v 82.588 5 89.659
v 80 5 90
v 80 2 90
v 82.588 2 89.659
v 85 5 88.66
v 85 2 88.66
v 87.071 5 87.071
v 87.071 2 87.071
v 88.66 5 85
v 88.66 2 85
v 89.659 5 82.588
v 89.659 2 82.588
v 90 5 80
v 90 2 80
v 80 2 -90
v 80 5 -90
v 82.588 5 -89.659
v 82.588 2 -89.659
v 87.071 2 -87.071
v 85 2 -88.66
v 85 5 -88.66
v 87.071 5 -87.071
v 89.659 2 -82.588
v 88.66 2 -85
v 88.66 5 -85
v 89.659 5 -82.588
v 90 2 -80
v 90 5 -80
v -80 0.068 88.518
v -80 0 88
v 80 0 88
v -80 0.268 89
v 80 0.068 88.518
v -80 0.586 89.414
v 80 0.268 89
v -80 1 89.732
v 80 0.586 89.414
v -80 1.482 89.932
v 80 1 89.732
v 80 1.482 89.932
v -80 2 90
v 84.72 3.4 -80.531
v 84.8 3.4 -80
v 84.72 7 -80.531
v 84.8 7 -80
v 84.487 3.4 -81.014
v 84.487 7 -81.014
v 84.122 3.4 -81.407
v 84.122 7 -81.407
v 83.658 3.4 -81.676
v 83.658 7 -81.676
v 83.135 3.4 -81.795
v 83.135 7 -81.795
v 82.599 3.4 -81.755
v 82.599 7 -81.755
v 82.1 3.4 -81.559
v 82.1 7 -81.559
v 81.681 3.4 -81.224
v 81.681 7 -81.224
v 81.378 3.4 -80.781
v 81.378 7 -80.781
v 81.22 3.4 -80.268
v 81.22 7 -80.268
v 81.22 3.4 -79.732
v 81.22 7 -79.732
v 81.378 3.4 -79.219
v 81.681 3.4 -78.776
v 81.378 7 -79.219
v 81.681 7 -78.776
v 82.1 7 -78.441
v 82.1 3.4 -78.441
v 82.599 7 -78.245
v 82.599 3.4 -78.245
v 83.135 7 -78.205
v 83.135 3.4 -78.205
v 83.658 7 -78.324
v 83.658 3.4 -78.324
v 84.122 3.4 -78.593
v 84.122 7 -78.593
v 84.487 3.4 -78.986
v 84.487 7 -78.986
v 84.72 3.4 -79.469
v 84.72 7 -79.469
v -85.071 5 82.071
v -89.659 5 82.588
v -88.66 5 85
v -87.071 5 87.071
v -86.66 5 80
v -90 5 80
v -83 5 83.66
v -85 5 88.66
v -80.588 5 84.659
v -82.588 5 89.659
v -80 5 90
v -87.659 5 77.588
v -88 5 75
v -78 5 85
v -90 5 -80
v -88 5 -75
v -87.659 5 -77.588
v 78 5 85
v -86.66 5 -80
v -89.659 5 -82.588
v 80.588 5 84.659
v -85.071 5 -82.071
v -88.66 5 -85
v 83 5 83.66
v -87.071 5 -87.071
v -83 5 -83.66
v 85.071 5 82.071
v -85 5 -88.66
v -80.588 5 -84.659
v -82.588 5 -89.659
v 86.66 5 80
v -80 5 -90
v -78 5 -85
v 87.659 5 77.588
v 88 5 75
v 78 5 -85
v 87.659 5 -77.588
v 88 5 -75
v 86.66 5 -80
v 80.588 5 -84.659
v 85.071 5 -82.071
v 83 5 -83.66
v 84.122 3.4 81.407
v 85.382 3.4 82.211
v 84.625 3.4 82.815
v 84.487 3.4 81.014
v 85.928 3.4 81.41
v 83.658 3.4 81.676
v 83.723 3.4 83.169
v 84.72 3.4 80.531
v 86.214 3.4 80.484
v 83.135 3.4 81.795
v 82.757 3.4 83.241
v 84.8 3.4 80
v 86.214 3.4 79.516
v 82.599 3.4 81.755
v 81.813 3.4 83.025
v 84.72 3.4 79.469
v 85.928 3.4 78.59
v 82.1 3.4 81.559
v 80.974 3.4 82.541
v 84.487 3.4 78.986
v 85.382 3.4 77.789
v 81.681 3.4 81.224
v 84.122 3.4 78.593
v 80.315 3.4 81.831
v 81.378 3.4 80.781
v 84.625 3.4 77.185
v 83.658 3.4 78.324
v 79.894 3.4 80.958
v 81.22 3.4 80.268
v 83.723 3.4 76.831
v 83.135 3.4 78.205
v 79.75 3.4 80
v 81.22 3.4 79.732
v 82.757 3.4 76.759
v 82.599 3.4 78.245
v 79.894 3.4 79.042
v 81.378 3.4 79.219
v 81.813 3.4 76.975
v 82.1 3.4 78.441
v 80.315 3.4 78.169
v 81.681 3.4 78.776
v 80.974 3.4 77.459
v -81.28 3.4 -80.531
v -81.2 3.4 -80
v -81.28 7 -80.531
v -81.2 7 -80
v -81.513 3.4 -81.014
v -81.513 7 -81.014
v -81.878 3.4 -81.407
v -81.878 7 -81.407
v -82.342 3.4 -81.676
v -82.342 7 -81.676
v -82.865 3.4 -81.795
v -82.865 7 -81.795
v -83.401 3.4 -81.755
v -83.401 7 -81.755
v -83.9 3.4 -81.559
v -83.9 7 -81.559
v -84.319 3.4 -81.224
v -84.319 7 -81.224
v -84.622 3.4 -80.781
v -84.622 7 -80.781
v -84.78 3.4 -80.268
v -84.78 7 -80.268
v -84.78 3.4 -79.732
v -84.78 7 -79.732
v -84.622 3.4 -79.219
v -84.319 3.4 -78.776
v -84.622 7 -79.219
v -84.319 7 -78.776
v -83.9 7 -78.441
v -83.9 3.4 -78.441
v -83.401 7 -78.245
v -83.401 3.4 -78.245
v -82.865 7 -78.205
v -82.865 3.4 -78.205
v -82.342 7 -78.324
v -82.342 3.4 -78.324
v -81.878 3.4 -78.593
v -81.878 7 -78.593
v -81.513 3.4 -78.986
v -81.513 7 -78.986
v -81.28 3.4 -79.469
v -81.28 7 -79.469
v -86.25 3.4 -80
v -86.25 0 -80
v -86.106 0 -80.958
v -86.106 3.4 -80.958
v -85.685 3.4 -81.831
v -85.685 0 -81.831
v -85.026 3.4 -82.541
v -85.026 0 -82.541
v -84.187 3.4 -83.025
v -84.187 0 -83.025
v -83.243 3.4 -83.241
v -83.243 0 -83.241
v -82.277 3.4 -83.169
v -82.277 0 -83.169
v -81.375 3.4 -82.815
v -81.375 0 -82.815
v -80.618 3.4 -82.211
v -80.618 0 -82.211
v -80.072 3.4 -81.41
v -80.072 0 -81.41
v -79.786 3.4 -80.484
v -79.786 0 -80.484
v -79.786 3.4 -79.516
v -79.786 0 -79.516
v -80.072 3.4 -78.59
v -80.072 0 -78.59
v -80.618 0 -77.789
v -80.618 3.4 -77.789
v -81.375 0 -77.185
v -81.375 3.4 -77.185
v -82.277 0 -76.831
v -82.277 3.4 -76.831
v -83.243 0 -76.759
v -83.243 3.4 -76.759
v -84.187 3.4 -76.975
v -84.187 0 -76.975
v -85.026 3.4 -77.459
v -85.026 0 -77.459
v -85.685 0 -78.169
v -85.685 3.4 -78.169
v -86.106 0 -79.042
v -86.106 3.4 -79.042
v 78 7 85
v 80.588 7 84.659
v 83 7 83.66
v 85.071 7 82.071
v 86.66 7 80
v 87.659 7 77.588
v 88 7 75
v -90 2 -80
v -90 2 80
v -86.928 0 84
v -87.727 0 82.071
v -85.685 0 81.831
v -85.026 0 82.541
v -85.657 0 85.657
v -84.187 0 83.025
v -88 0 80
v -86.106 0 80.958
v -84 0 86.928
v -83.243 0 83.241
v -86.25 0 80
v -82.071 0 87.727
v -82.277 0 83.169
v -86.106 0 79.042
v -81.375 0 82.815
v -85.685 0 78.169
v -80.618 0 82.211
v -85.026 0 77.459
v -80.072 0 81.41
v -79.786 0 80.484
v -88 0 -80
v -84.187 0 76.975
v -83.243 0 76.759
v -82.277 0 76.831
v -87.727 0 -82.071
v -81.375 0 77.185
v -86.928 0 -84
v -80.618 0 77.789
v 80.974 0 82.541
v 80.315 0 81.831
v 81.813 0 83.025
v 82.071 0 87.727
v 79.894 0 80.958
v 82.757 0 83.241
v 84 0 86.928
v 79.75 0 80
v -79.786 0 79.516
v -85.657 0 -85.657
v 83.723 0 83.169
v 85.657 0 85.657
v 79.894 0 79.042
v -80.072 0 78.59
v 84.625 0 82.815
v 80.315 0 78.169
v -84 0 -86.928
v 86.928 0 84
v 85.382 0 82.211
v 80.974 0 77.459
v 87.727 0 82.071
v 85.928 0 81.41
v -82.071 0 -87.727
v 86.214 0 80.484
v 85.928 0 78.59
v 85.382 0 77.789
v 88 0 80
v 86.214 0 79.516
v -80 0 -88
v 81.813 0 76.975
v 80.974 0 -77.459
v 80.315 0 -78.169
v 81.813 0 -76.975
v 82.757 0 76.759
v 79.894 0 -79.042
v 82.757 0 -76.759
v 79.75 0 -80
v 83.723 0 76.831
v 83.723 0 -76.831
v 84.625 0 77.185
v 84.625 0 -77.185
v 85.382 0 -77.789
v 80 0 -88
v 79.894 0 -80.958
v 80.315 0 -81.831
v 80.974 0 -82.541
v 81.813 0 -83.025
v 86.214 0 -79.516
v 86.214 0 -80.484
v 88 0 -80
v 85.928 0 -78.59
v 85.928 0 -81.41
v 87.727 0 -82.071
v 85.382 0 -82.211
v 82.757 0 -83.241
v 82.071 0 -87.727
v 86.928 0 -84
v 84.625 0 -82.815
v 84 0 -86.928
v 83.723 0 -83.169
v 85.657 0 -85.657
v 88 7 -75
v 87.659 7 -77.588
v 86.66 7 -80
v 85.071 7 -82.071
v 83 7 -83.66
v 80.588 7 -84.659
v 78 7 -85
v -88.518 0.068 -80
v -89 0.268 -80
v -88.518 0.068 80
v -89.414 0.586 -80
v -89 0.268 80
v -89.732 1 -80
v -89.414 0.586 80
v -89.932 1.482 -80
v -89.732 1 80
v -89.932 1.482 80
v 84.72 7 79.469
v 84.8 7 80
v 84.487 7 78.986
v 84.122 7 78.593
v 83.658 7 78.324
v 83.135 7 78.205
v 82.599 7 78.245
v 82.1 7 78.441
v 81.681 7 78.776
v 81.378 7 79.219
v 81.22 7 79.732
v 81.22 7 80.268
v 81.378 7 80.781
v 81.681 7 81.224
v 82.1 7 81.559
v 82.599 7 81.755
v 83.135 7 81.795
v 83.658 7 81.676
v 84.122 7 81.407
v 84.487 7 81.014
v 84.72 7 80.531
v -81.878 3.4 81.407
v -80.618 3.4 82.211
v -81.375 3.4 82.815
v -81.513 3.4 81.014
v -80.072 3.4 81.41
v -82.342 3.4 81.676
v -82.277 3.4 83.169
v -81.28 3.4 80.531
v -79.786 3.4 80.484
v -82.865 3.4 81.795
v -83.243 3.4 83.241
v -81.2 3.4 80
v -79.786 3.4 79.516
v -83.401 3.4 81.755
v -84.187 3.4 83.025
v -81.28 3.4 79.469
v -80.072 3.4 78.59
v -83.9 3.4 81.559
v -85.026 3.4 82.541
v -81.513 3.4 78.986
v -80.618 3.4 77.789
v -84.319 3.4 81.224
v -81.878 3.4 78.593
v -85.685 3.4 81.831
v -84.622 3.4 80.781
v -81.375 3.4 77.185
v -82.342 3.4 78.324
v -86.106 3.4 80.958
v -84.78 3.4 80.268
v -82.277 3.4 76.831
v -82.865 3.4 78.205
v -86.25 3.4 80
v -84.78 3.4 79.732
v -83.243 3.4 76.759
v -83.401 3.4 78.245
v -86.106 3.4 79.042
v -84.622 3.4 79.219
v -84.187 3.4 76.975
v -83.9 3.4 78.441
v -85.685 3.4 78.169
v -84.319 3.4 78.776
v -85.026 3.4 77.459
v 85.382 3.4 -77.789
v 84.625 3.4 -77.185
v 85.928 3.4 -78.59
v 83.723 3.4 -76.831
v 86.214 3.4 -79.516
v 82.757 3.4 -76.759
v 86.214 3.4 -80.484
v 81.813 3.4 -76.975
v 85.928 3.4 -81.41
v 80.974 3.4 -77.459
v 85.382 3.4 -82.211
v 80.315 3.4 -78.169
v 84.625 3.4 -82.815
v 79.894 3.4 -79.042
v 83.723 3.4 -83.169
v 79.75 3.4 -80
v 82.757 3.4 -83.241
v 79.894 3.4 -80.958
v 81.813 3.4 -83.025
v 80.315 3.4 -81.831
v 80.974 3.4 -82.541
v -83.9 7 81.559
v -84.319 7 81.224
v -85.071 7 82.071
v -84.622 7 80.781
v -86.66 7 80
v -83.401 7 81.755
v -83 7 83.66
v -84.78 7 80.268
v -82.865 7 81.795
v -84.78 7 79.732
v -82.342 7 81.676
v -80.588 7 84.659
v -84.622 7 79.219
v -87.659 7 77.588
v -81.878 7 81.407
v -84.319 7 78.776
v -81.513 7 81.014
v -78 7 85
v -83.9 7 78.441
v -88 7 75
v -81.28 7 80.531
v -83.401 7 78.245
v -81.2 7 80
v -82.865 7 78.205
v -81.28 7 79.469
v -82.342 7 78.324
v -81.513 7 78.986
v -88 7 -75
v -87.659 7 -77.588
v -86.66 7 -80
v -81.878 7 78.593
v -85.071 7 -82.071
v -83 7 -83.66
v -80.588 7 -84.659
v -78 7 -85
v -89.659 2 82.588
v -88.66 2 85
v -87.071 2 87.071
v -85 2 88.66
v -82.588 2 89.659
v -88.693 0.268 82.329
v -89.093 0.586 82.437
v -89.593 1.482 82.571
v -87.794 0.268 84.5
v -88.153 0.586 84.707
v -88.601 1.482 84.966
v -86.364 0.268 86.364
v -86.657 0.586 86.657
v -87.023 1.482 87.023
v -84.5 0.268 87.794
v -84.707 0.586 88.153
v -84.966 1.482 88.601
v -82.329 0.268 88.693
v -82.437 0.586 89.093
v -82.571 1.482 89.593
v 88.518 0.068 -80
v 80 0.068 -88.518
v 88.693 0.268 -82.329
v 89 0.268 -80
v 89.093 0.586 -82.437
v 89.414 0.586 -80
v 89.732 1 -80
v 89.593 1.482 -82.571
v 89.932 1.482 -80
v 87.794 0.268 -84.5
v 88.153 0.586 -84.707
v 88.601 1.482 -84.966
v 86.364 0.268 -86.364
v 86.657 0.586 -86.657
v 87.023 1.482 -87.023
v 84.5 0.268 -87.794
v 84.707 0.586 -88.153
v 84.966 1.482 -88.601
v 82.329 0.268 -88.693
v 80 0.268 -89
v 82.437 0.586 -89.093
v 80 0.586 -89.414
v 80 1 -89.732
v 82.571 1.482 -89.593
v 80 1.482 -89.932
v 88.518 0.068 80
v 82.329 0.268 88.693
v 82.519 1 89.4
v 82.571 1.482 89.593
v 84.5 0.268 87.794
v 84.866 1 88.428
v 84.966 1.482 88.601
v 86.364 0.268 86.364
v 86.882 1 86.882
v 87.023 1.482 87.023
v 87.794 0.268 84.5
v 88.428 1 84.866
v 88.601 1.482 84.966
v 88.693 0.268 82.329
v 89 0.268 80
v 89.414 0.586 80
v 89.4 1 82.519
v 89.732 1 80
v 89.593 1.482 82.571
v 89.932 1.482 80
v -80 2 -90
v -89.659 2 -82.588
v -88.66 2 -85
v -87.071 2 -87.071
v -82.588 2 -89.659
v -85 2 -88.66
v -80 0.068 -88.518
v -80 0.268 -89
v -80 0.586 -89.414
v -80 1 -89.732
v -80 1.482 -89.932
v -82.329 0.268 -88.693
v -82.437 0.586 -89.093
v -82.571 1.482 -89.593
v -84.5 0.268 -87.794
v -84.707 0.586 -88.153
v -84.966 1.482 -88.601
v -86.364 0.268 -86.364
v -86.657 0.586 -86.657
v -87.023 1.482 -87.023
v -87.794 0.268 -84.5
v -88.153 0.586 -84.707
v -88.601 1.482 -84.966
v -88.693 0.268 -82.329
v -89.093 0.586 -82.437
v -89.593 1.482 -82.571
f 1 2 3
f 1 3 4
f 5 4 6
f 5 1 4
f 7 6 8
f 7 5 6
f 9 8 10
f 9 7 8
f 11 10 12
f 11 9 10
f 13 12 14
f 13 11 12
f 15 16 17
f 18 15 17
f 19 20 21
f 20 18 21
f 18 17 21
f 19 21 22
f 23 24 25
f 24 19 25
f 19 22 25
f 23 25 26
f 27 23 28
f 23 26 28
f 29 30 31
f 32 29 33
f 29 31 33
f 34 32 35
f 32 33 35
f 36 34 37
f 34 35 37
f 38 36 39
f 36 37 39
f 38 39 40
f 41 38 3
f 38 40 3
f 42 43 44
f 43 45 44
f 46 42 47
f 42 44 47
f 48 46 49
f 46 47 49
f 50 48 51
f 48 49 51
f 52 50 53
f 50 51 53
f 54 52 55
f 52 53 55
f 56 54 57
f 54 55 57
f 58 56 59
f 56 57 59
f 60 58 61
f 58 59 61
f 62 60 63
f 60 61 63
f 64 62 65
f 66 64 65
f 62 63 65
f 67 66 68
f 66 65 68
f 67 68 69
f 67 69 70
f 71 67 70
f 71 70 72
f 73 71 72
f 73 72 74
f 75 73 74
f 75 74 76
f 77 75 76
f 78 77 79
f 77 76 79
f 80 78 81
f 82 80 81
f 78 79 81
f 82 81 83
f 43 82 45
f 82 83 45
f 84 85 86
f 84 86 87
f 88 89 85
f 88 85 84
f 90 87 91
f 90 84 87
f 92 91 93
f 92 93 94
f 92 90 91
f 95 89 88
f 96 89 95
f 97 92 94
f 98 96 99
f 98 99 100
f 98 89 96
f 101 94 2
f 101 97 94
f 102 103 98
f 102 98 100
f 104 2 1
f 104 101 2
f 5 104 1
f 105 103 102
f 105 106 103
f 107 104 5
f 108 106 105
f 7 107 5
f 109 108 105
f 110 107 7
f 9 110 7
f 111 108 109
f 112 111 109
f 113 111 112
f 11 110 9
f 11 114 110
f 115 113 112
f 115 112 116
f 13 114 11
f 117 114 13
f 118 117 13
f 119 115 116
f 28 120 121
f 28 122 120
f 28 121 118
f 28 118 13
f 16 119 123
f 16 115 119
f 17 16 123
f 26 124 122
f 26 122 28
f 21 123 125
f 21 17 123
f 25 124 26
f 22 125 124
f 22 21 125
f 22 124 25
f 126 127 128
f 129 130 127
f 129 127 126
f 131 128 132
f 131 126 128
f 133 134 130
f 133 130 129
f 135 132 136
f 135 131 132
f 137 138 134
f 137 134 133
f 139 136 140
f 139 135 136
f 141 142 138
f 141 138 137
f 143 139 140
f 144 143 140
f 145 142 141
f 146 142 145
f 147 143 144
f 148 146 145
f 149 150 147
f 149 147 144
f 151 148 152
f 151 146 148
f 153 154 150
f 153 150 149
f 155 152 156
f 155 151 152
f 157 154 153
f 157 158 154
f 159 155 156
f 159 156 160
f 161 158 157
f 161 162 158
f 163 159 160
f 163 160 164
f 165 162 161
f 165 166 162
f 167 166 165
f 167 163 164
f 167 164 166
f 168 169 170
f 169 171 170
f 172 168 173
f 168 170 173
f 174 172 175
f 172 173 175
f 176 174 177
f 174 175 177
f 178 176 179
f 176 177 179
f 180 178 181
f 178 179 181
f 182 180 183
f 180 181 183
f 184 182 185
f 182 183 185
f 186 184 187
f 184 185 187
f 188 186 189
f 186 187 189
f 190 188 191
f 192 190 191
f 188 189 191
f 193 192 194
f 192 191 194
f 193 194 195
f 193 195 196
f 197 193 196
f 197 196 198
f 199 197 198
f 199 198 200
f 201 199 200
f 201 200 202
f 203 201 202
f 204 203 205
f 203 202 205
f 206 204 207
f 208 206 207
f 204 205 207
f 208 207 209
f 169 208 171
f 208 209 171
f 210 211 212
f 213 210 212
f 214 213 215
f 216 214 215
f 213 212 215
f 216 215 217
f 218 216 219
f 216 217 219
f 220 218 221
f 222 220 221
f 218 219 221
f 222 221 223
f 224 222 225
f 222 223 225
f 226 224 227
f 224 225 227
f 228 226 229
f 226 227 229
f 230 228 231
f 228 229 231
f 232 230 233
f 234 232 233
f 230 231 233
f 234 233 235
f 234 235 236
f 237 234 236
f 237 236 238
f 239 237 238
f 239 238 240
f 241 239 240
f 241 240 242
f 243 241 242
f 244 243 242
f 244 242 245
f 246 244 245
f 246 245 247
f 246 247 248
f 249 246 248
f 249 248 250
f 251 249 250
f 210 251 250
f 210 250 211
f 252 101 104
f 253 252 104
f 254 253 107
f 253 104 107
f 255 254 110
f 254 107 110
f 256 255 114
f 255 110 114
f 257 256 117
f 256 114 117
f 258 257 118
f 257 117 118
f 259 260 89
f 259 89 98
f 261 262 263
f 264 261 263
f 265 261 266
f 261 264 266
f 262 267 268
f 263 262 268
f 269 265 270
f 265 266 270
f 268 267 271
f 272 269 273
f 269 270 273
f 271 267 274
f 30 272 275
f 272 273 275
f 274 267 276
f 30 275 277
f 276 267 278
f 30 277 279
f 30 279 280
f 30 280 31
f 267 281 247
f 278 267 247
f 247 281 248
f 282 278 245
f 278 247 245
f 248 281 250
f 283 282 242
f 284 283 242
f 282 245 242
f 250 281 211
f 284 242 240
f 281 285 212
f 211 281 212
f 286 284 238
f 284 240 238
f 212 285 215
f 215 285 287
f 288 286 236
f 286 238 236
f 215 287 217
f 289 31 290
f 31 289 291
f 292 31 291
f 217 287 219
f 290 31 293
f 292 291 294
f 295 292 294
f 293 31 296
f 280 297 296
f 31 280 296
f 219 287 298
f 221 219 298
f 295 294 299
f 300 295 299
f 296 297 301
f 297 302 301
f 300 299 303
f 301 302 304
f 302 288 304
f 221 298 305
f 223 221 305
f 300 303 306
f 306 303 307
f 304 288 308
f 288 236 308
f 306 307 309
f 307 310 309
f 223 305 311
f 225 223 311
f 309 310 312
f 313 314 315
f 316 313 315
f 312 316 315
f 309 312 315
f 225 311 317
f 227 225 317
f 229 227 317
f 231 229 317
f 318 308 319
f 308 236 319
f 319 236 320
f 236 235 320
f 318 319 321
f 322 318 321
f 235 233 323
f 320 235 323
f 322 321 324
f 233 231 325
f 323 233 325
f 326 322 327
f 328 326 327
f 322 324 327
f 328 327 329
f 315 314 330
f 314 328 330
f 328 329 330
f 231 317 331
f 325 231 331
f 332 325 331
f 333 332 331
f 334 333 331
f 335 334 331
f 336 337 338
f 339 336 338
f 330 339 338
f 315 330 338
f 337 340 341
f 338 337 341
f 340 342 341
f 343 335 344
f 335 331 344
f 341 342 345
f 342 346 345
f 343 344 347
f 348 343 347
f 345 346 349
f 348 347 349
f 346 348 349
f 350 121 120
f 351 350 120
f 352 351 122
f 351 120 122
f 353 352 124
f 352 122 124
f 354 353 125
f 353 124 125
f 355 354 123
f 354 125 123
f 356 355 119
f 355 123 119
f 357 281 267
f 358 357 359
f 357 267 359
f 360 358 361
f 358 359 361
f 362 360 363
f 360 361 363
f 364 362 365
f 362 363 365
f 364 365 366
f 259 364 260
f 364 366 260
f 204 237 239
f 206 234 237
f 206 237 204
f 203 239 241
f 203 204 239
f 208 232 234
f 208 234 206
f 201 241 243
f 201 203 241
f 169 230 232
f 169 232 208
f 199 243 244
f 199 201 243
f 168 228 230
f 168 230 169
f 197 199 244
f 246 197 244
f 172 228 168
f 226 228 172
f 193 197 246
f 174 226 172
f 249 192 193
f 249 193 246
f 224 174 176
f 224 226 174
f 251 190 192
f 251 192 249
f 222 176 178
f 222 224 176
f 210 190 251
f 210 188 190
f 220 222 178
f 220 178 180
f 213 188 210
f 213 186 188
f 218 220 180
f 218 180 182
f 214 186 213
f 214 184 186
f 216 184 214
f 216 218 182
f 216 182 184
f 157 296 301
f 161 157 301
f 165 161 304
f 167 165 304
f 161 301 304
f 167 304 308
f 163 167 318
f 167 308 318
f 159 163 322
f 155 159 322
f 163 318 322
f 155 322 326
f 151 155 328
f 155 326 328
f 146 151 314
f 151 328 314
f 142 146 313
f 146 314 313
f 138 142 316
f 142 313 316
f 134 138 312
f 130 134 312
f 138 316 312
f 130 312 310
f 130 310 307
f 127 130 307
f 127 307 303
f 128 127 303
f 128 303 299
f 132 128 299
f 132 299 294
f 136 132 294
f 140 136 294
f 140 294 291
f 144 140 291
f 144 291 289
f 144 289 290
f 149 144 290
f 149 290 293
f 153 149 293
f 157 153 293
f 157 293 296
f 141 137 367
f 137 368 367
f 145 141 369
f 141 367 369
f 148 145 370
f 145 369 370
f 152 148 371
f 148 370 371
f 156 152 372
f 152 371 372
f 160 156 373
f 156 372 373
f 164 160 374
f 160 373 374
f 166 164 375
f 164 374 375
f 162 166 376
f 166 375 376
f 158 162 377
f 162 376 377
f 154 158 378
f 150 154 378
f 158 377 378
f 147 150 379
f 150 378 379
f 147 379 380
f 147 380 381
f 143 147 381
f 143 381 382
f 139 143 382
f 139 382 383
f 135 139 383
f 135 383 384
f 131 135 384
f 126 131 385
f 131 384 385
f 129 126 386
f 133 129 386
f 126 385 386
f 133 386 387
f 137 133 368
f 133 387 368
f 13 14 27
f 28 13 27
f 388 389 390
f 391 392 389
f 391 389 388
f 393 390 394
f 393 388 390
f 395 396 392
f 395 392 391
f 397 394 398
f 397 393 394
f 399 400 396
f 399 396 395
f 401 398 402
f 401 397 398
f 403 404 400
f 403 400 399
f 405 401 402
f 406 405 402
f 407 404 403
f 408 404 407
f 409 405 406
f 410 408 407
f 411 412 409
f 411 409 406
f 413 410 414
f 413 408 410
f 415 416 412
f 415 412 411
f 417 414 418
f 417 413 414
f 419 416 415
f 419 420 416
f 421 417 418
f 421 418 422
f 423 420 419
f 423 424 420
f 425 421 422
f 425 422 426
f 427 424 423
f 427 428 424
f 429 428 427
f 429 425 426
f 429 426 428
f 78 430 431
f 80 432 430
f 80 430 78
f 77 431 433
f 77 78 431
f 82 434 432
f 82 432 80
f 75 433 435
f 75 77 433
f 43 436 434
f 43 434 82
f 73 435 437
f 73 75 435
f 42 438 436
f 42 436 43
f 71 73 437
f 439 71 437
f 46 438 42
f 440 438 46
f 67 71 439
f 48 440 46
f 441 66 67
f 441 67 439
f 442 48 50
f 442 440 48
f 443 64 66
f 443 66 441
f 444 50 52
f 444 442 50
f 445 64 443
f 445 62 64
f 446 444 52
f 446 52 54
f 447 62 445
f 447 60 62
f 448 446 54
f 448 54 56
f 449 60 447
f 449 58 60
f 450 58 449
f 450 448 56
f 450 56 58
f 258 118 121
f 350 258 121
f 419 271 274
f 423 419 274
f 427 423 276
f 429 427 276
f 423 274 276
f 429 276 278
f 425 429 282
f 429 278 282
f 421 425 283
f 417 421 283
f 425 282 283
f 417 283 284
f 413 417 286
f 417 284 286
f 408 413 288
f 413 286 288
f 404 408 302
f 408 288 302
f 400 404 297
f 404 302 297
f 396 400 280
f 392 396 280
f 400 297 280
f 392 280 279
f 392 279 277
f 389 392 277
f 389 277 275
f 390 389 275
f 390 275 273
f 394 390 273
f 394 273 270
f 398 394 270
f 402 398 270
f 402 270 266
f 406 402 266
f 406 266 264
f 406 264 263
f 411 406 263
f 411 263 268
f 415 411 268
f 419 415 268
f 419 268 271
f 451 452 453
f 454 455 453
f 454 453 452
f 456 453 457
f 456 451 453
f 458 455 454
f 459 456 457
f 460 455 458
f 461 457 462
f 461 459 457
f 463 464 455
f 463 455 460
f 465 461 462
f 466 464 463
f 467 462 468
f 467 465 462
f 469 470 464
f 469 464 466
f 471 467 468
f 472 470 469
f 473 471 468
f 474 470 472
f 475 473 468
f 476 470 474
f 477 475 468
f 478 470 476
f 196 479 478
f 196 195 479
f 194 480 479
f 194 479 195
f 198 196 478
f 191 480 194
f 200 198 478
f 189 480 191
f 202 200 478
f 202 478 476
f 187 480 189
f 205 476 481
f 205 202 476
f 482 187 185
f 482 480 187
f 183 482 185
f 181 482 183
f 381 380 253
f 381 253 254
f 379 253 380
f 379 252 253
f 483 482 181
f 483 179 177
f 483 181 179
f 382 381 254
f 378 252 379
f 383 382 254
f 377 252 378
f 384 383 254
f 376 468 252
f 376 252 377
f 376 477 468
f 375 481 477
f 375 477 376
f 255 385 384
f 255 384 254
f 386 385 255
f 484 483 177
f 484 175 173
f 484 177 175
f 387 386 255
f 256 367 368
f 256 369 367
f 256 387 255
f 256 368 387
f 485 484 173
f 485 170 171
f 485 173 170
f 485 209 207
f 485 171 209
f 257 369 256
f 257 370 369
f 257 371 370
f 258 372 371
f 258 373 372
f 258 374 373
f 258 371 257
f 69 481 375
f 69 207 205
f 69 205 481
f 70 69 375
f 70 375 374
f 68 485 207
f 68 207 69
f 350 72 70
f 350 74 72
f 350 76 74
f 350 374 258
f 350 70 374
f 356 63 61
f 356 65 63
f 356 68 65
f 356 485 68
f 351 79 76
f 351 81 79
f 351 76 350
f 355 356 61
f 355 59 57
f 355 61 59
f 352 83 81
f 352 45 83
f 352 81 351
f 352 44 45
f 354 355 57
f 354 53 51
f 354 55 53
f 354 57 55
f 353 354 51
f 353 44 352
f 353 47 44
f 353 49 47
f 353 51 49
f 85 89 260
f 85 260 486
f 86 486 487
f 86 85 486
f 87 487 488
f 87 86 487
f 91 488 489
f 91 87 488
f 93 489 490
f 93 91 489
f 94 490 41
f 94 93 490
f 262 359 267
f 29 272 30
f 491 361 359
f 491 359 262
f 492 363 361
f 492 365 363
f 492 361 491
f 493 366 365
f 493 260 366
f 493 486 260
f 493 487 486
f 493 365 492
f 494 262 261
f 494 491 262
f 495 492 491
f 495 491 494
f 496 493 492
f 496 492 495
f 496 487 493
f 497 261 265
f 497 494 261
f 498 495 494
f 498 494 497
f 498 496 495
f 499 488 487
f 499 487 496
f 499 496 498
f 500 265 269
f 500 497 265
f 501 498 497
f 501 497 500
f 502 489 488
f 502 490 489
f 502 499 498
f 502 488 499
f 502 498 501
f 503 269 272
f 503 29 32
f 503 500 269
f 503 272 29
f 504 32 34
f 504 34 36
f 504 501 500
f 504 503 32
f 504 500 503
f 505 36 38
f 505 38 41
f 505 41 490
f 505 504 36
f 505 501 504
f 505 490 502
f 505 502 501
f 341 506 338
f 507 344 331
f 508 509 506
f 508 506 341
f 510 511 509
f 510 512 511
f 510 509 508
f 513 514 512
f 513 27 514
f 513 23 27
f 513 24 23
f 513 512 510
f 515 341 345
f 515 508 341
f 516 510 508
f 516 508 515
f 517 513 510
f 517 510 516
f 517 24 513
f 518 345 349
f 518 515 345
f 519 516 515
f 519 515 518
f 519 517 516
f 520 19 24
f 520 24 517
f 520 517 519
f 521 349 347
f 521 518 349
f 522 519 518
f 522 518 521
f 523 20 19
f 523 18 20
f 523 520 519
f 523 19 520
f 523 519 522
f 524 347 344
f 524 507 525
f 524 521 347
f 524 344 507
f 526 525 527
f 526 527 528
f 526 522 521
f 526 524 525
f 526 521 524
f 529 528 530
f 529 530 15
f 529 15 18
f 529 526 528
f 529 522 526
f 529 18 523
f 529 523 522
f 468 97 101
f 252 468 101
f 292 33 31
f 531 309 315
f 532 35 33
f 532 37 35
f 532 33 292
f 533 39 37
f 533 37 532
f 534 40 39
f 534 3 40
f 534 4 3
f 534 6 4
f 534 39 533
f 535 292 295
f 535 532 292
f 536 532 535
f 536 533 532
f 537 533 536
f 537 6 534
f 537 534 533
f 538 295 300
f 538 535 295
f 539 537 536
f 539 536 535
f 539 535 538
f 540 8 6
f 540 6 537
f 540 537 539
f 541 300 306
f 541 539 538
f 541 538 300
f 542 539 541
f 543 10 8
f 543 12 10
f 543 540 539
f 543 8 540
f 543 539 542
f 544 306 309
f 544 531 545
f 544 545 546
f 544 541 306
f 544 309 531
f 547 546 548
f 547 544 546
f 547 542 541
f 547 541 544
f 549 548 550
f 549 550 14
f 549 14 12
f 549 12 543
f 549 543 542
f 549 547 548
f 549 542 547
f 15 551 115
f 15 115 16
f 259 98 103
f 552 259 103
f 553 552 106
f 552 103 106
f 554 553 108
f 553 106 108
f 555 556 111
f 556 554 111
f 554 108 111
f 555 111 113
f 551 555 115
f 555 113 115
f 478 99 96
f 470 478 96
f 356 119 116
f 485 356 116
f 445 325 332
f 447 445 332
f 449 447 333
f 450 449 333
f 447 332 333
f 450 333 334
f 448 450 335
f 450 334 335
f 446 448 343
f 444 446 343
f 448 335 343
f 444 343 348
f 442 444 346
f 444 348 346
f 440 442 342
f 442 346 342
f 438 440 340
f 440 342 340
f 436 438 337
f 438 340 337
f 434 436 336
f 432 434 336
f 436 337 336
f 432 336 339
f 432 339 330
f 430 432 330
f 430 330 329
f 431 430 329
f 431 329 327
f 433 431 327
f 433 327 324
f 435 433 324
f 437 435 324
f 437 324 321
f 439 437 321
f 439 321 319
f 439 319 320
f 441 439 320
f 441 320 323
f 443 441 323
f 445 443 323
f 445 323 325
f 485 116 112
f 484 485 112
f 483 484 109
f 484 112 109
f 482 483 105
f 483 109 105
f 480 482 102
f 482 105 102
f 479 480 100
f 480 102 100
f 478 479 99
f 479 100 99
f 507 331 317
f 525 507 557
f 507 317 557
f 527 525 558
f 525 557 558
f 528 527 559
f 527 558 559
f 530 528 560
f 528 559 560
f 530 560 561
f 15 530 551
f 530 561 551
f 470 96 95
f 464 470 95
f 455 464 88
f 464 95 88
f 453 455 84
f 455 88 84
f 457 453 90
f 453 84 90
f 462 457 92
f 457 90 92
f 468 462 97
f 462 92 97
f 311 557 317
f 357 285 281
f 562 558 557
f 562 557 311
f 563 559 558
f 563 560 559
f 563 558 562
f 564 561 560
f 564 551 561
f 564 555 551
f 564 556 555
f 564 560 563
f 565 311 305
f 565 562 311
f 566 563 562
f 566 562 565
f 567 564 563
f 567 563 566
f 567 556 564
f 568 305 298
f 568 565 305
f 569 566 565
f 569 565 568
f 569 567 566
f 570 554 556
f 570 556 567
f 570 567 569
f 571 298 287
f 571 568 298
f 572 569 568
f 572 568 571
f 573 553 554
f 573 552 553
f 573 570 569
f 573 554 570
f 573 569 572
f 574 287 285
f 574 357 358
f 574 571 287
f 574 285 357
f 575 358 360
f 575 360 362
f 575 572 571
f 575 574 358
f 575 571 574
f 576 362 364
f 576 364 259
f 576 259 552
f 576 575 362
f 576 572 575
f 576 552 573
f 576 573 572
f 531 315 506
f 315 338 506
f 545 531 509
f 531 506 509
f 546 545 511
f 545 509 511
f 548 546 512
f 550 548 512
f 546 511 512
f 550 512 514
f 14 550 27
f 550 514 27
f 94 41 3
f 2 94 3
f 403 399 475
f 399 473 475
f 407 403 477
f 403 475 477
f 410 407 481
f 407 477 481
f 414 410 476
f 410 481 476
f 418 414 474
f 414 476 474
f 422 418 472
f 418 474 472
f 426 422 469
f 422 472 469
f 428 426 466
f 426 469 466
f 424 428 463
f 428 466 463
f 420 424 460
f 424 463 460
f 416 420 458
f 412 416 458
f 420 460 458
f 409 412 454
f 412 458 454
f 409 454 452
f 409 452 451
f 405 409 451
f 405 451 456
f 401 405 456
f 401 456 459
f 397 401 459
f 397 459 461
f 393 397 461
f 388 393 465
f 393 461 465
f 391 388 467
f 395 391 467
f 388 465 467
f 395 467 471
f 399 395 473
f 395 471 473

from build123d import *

# Parameters (mm, degrees)
SKIZZE1_W                                            = 180
SKIZZE1_H                                            = 180
AUFSATZ_LINEAR_AUSTRAGEN1_DEPTH                      = 5
AUFSATZ_LINEAR_AUSTRAGEN2_DEPTH                      = 2
STIRNSENKUNG_F_R_M3_ZYLINDERSCHRAUBE_MIT_D           = 3.6
STIRNSENKUNG_F_R_M3_ZYLINDERSCHRAUBE_MIT_DEPTH       = 9.1
STIRNSENKUNG_F_R_M3_ZYLINDERSCHRAUBE_MIT_CBORE_D     = 6.5
STIRNSENKUNG_F_R_M3_ZYLINDERSCHRAUBE_MIT_CBORE_DEPTH = 3.4
STIRNSENKUNG_F_R_M3_ZYLINDERSCHRAUBE_MIT_TIP         = 1.081549114
VERRUNDUNG1_R                                        = 10
VERRUNDUNG2_R                                        = 2


with BuildPart() as part:
    # Skizze1 → Aufsatz-Linear austragen1 (new body)
    with BuildSketch(Plane(origin=(0, 0, 0), x_dir=(1, 0, 0), z_dir=(0, 1, 0))):
        Rectangle(SKIZZE1_W, SKIZZE1_H)
    extrude(amount=AUFSATZ_LINEAR_AUSTRAGEN1_DEPTH)

    # Skizze2 → Aufsatz-Linear austragen2 (add)
    with BuildSketch(Plane(origin=(0, 5, 0), x_dir=(1, 0, 0), z_dir=(0, 1, 0))):
        with BuildLine():
            Line((78, 85), (-78, 85))
            ThreePointArc((-78, 85), (-85.071067812, 82.071067812), (-88, 75))
            Line((-88, 75), (-88, -75))
            ThreePointArc((-88, -75), (-85.071067812, -82.071067812), (-78, -85))
            Line((-78, -85), (78, -85))
            ThreePointArc((78, -85), (85.071067812, -82.071067812), (88, -75))
            Line((88, -75), (88, 75))
            ThreePointArc((88, 75), (85.071067812, 82.071067812), (78, 85))
        make_face()
    extrude(amount=AUFSATZ_LINEAR_AUSTRAGEN2_DEPTH)

    # Stirnsenkung für M3 Zylinderschraube mit Innensechskant2
    with Locations(Plane(origin=(0, 0, 0), x_dir=(-1, 0, 0), z_dir=(0, -1, 0))):
        with Locations((-83, 80), (83, 80), (83, -80), (-83, -80)):
            CounterBoreHole(STIRNSENKUNG_F_R_M3_ZYLINDERSCHRAUBE_MIT_D / 2, STIRNSENKUNG_F_R_M3_ZYLINDERSCHRAUBE_MIT_CBORE_D / 2, STIRNSENKUNG_F_R_M3_ZYLINDERSCHRAUBE_MIT_CBORE_DEPTH, depth=STIRNSENKUNG_F_R_M3_ZYLINDERSCHRAUBE_MIT_DEPTH)
            with Locations((0, 0, -(STIRNSENKUNG_F_R_M3_ZYLINDERSCHRAUBE_MIT_DEPTH + STIRNSENKUNG_F_R_M3_ZYLINDERSCHRAUBE_MIT_TIP / 2))):  # 118° drill point
                Cone(0, STIRNSENKUNG_F_R_M3_ZYLINDERSCHRAUBE_MIT_D / 2, STIRNSENKUNG_F_R_M3_ZYLINDERSCHRAUBE_MIT_TIP, mode=Mode.SUBTRACT)

    # Verrundung1
    verrundung1_edges = [part.edges().sort_by_distance(p)[0] for p in [
        (90, 2.5, -90),
        (90, 2.5, 90),
        (-90, 2.5, 90),
        (-90, 2.5, -90),
    ]]
    fillet(verrundung1_edges, radius=VERRUNDUNG1_R)

    # Verrundung2
    verrundung2_edges = [part.edges().sort_by_distance(p)[0] for p in [
        (90, 0, 0),
        (0, 0, -90),
        (0, 0, 90),
        (-90, 0, 0),
        (87.071067812, 0, -87.071067812),
        (-87.071067812, 0, -87.071067812),
        (-87.071067812, 0, 87.071067812),
        (87.071067812, 0, 87.071067812),
    ]]
    fillet(verrundung2_edges, radius=VERRUNDUNG2_R)


solid = part.part
